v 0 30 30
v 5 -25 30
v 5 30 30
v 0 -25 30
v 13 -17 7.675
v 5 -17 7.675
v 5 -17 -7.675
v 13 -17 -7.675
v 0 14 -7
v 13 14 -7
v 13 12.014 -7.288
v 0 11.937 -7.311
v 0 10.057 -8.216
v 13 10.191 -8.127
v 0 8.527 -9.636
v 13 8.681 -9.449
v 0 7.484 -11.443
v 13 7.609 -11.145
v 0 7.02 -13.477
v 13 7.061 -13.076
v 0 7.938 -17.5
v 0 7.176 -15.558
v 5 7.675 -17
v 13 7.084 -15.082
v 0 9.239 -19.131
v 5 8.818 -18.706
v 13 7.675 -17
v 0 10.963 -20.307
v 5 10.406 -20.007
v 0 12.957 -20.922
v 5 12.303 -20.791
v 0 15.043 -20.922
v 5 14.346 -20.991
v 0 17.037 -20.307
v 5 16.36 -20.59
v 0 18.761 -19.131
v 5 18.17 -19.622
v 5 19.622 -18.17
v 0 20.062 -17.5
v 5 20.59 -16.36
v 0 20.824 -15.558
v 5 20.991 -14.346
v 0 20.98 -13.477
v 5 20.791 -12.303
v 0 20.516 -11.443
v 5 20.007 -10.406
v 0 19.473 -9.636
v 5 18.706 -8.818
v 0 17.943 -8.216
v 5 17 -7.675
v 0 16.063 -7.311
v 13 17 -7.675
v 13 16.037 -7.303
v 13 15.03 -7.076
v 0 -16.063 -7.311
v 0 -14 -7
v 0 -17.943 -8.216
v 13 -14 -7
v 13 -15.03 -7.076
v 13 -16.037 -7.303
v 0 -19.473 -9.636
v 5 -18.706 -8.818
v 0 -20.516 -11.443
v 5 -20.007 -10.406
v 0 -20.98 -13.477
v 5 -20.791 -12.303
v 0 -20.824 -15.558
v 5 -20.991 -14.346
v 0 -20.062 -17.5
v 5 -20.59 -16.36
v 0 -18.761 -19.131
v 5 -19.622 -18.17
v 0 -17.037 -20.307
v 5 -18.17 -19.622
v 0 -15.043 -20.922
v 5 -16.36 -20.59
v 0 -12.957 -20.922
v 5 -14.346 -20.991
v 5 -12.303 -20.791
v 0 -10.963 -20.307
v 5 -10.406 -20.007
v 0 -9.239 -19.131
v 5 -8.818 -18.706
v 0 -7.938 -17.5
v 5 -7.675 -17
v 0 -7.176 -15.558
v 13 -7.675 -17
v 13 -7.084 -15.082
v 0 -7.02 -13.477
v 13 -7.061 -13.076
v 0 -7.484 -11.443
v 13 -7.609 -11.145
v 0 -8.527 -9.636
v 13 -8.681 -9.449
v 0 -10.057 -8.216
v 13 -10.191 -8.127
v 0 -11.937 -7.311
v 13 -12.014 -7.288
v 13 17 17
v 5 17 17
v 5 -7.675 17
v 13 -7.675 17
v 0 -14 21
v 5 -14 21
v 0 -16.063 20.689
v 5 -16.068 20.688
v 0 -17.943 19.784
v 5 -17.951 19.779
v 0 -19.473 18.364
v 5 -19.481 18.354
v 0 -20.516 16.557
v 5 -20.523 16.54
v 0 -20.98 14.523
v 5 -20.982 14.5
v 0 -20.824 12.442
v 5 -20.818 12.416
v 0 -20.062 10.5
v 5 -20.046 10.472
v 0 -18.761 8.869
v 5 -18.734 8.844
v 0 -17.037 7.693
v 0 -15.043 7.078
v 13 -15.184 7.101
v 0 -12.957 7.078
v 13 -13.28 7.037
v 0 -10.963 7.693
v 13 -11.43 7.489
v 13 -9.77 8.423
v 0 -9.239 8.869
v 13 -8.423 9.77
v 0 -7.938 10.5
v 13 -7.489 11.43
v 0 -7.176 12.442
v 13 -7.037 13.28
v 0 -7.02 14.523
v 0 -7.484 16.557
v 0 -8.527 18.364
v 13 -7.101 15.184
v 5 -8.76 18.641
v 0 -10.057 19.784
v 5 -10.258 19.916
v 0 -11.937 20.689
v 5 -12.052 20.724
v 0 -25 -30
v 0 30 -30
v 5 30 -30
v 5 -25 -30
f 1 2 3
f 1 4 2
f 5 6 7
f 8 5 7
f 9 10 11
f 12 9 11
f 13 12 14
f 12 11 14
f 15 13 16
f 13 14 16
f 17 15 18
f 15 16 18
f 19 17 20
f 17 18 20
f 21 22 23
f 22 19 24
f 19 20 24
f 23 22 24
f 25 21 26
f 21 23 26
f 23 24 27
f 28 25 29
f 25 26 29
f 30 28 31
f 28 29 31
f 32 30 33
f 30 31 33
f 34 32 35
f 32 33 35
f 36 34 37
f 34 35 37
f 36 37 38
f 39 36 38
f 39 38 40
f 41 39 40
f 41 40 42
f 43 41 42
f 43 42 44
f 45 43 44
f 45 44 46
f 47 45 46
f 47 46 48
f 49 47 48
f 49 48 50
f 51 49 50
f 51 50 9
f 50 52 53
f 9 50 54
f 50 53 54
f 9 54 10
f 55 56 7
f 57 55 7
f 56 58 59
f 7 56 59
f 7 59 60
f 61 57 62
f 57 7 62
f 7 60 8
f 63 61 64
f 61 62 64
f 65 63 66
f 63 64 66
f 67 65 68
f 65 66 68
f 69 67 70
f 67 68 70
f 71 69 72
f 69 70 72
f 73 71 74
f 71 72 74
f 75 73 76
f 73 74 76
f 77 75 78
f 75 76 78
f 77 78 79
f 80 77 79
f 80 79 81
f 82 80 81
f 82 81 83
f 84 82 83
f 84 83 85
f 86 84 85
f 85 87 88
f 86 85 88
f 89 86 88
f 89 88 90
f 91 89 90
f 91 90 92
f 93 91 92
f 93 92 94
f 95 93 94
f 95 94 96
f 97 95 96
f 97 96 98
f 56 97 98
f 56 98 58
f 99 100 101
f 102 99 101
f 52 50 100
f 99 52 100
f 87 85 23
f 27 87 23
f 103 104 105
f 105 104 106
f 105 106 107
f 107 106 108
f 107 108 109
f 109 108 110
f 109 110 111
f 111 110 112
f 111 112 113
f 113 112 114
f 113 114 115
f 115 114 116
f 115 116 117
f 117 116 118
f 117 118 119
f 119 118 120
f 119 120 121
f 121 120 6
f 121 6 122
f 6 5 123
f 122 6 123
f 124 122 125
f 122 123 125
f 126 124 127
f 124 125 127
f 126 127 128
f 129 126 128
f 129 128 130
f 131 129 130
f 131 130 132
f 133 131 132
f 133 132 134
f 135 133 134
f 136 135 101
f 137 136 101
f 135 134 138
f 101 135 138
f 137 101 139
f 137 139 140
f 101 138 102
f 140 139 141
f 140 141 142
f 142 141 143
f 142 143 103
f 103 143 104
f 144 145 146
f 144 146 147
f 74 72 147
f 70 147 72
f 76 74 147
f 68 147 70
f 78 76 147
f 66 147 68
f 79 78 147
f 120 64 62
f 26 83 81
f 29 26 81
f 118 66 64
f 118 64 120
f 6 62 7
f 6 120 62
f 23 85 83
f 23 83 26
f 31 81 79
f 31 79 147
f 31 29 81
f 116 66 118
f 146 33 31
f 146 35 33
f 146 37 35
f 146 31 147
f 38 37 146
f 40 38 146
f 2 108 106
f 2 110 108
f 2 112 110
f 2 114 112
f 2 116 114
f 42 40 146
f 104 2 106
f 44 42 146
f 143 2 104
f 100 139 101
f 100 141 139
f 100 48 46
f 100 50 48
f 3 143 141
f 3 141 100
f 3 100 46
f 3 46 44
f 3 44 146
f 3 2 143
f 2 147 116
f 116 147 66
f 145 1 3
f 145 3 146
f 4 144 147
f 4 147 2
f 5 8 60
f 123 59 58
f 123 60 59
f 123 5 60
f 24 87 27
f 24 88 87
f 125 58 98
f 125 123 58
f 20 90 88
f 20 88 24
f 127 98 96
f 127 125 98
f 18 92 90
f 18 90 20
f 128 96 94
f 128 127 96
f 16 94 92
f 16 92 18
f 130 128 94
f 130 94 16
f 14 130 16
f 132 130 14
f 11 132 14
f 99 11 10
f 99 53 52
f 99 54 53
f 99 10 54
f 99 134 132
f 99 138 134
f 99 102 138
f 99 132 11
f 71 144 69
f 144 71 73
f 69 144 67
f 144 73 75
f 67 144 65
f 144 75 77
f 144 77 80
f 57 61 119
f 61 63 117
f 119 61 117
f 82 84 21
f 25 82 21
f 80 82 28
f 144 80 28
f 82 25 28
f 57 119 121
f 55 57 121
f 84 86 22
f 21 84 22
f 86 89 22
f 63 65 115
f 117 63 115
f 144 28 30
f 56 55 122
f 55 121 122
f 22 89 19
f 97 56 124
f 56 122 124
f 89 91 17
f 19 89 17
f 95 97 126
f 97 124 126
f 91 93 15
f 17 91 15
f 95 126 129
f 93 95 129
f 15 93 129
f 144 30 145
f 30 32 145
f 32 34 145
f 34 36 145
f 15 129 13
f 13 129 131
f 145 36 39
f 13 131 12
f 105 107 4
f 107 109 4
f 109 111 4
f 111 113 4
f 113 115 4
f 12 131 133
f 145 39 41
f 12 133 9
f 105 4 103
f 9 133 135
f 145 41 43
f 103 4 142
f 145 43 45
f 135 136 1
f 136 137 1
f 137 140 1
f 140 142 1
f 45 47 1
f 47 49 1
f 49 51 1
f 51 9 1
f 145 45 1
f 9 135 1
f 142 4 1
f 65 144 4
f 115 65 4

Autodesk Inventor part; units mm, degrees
ref_plane "YZ Plane" through (0, 0, 0) normal (1, 0, 0) x (0, 1, 0)
ref_plane "XZ Plane" through (0, 0, 0) normal (0, 1, 0) x (-1, 0, 0)
ref_plane "XY Plane" through (0, 0, 0) normal (0, 0, 1) x (1, 0, 0)
sketch "Skizze1" plane through (0, 0, 0) normal (1, 0, 0) x (0, 1, 0)
  line L0 (14, 14) -> (-14, 14)
  line L1 (-14, 14) -> (-14, -14)
  line L2 (-14, -14) -> (14, -14)
  line L3 (14, -14) -> (14, 14)
  line L4 (14, 14) -> (-14, -14) construction
  line L5 (-14, 14) -> (14, -14) construction
  line L6 (17, 17) -> (-17, 17)
  line L7 (-17, 17) -> (-17, -17)
  line L8 (-17, -17) -> (17, -17)
  line L9 (17, -17) -> (17, 17)
  line L10 (17, 17) -> (-17, -17) construction
  line L11 (-17, 17) -> (17, -17) construction
  line L12 (-25, 30) -> (30, 30)
  line L13 (30, 30) -> (30, -30)
  line L14 (30, -30) -> (-25, -30)
  line L15 (-25, -30) -> (-25, 30)
  point P0 (0, 0)
  dimension "d0" = 28
  dimension "d1" = 28
  dimension "d2" = 34
  dimension "d3" = 34
  dimension "d4" = 55
  dimension "d5" = 60
extrude "Extrusion1" add sketch "Skizze1" along normal blind 13 contours L3 L2 L1 L0 | L9 L8 L7 L6
sketch "Skizze2" plane through (13, 0, 0) normal (1, 0, 0) x (0, 0, -1)
  point P0 (0, 0)
extrude "Extrusion2" add sketch "Skizze1" along normal blind 5 contours L12 L13 L14 L15
hole "Bohrung1" at (0, 14, -14) at (0, -14, 14) at (0, -14, -14) direction (1, 0, 0) diameter 14 end through all
properties part number "Cube_Insert_Motion_adapter_srew"
